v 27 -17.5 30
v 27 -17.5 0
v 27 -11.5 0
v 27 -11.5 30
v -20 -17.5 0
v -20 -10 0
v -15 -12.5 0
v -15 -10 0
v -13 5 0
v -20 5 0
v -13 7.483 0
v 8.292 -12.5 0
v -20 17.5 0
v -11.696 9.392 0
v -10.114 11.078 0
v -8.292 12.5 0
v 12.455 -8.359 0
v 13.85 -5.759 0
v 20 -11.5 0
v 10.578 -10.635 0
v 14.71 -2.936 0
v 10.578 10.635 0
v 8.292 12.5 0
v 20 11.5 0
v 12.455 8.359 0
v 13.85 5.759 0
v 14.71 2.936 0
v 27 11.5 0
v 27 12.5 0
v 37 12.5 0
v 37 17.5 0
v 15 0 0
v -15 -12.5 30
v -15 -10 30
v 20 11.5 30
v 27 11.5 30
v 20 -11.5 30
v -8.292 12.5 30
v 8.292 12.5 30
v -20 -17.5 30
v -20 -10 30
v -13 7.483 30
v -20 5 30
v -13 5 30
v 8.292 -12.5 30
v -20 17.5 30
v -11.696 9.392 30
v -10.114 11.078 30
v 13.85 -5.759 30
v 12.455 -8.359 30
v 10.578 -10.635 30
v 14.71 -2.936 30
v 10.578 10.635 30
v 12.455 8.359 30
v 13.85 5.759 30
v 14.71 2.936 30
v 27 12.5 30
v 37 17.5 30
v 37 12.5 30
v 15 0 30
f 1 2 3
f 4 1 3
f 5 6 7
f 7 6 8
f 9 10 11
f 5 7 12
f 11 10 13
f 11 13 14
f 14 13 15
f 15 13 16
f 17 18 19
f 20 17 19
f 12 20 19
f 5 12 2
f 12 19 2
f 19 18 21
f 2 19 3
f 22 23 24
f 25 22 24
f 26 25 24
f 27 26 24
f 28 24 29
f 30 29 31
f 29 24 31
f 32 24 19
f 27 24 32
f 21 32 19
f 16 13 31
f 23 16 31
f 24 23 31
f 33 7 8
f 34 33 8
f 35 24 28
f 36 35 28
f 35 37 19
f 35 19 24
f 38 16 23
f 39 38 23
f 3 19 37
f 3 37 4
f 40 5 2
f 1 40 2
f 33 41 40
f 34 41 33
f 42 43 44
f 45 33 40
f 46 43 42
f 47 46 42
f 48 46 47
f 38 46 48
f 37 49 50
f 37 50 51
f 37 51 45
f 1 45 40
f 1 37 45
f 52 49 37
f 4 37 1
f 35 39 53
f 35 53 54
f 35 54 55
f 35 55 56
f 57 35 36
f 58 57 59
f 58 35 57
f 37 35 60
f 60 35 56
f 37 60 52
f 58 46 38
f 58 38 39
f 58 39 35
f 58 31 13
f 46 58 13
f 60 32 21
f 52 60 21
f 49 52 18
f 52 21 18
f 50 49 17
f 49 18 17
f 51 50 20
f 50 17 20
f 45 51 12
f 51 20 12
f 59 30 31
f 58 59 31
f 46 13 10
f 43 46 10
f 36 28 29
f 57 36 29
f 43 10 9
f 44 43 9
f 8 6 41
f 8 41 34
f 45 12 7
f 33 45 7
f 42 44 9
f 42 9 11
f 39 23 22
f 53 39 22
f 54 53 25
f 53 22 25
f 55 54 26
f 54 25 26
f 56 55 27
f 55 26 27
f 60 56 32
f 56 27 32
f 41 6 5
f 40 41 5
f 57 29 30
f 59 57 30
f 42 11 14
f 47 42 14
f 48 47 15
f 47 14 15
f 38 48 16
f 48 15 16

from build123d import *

# Parameters (mm, degrees)
F0_W     = 7
F0_H     = 5
F0_H_2   = 1
F0_W_2   = 10
F0_W_3   = 5
F0_H_3   = 2.5
F1_DEPTH = 30


with BuildPart() as f1:
    # F0 (on Top) → F1 (new body)
    with BuildSketch(Plane.XY):
        with BuildLine():
            Line((20, 12.5), (20, 17.5))
            Line((20, 17.5), (-13, 17.5))
            Line((-13, 17.5), (-13, 12.5))
            Line((-13, 12.5), (-8.2915619759, 12.5))
            ThreePointArc((-8.2915619759, 12.5), (0, 15), (8.2915619759, 12.5))
            Line((8.2915619759, 12.5), (20, 12.5))
        make_face()
        with Locations((23.5, 15)):
            Rectangle(F0_W, F0_H)
        with Locations((-16.5, 15)):
            Rectangle(F0_W, F0_H)
        with Locations((23.5, 12)):
            Rectangle(F0_W, F0_H_2)
        with BuildLine():
            Line((20, 11.5), (20, 12.5))
            Line((20, 12.5), (8.2915619759, 12.5))
            ThreePointArc((8.2915619759, 12.5), (13.2169101843, 7.0931858273), (15, 0))
            ThreePointArc((15, 0), (13.2169101843, -7.0931858273), (8.2915619759, -12.5))
            Line((8.2915619759, -12.5), (20, -12.5))
            Line((20, -12.5), (20, -11.5))
            Line((20, -11.5), (20, 11.5))
        make_face()
        with Locations((32, 15)):
            Rectangle(F0_W_2, F0_H)
        with BuildLine():
            Line((-13, 7.4833147735), (-13, 12.5))
            Line((-13, 12.5), (-20, 12.5))
            Line((-20, 12.5), (-20, 5))
            Line((-20, 5), (-14.1421356237, 5))
            ThreePointArc((-14.1421356237, 5), (-13.627750901, 6.2677272898), (-13, 7.4833147735))
        make_face()
        with BuildLine():
            Line((-8.2915619759, 12.5), (-13, 12.5))
            Line((-13, 12.5), (-13, 7.4833147735))
            ThreePointArc((-13, 7.4833147735), (-10.9372956213, 10.2652600791), (-8.2915619759, 12.5))
        make_face()
        with BuildLine():
            Line((-8.2915619759, 12.5), (8.2915619759, 12.5))
            ThreePointArc((8.2915619759, 12.5), (0, 15), (-8.2915619759, 12.5))
        make_face()
        with BuildLine():
            Line((-13, 5), (-13, 7.4833147735))
            ThreePointArc((-13, 7.4833147735), (-13.627750901, 6.2677272898), (-14.1421356237, 5))
            Line((-14.1421356237, 5), (-13, 5))
        make_face()
        with Locations((23.5, -12)):
            Rectangle(F0_W, F0_H_2)
        with Locations((23.5, -15)):
            Rectangle(F0_W, F0_H)
        with BuildLine():
            Line((20, -17.5), (20, -12.5))
            Line((20, -12.5), (8.2915619759, -12.5))
            ThreePointArc((8.2915619759, -12.5), (4.3301270189, -14.3614066163), (0, -15))
            Line((0, -15), (-15, -15))
            Line((-15, -15), (-15, -17.5))
            Line((-15, -17.5), (20, -17.5))
        make_face()
        with BuildLine():
            ThreePointArc((0, -15), (4.3301270189, -14.3614066163), (8.2915619759, -12.5))
            Line((8.2915619759, -12.5), (-8.2915619759, -12.5))
            ThreePointArc((-8.2915619759, -12.5), (-4.3301270189, -14.3614066163), (0, -15))
        make_face()
        with Locations((-17.5, -11.25)):
            Rectangle(F0_W_3, F0_H_3)
        with BuildLine():
            ThreePointArc((0, -15), (-4.3301270189, -14.3614066163), (-8.2915619759, -12.5))
            Line((-8.2915619759, -12.5), (-15, -12.5))
            Line((-15, -12.5), (-15, -15))
            Line((-15, -15), (0, -15))
        make_face()
        Polygon((-15, -12.5), (-20, -12.5), (-20, -17.5), (-15, -17.5), (-15, -15), align=None)
    extrude(amount=F1_DEPTH)


solid = f1.part
